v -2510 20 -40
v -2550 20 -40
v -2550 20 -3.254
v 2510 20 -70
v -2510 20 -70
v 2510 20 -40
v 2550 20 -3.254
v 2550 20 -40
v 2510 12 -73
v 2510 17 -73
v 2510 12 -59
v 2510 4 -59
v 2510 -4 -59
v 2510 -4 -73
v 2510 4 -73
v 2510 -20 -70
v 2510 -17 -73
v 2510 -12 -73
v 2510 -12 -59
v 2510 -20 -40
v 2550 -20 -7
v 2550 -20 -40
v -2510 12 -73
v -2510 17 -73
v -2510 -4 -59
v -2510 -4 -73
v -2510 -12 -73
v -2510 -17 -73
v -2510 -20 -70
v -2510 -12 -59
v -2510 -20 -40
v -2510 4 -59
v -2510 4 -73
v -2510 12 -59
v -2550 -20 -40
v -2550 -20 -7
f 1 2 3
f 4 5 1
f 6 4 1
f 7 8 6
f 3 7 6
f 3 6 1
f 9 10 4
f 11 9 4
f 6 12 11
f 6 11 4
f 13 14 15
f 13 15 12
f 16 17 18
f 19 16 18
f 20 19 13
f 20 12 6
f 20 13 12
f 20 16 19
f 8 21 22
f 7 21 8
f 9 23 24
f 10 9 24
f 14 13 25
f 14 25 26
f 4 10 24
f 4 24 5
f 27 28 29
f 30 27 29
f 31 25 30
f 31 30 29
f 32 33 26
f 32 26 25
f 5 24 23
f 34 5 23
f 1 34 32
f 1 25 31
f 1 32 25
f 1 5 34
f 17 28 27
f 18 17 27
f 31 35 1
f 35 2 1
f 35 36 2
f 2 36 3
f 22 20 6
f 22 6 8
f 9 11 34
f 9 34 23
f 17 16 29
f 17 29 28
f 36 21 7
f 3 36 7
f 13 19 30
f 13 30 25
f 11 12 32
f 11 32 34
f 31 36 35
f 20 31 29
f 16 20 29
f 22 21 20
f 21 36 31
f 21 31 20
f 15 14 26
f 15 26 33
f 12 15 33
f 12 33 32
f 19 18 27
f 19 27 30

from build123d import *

# Parameters (mm, degrees)
F1_DEPTH      = 2550
F2_W          = 80
F2_H          = 66
F3_DEPTH      = 50
F6_DEPTH      = 2550.001
F6_DEPTH_BACK = 2550.001


with BuildPart() as f1:
    # F0 (on Right) → F1 (new body, symmetric)
    with BuildSketch(Plane.YZ):
        Polygon((20, -70), (20, 56), (17, 59), (12, 59), (12, 73), (4, 73), (4, 59), (-4, 59), (-4, 73), (-12, 73), (-12, 59), (-17, 59), (-20, 56), (-20, -70), (-17, -73), (-12, -73), (-12, -59), (-4, -59), (-4, -73), (4, -73), (4, -59), (12, -59), (12, -73), (17, -73), align=None)
    extrude(amount=F1_DEPTH, both=True)

    # F2 (on Front) → F3 (cut, symmetric)
    with BuildSketch(Plane.XZ):
        with Locations((-2550, 59)):
            Rectangle(F2_W, F2_H)
        with Locations((-2550, -73)):
            Rectangle(F2_W, F2_H)
        with Locations((2550, 59)):
            Rectangle(F2_W, F2_H)
        with Locations((2550, -73)):
            Rectangle(F2_W, F2_H)
    extrude(amount=F3_DEPTH, both=True, mode=Mode.SUBTRACT)

    # F5 (on Right) → F6 (cut, two sides)
    with BuildSketch(Plane.YZ) as f6_sk:
        Polygon((30, -2.3176279375), (30, 83), (-30, 83), (-30, -7.9364744125), align=None)
    extrude(amount=-F6_DEPTH, mode=Mode.SUBTRACT)
    extrude(f6_sk.sketch, amount=F6_DEPTH_BACK, mode=Mode.SUBTRACT)


solid = f1.part
